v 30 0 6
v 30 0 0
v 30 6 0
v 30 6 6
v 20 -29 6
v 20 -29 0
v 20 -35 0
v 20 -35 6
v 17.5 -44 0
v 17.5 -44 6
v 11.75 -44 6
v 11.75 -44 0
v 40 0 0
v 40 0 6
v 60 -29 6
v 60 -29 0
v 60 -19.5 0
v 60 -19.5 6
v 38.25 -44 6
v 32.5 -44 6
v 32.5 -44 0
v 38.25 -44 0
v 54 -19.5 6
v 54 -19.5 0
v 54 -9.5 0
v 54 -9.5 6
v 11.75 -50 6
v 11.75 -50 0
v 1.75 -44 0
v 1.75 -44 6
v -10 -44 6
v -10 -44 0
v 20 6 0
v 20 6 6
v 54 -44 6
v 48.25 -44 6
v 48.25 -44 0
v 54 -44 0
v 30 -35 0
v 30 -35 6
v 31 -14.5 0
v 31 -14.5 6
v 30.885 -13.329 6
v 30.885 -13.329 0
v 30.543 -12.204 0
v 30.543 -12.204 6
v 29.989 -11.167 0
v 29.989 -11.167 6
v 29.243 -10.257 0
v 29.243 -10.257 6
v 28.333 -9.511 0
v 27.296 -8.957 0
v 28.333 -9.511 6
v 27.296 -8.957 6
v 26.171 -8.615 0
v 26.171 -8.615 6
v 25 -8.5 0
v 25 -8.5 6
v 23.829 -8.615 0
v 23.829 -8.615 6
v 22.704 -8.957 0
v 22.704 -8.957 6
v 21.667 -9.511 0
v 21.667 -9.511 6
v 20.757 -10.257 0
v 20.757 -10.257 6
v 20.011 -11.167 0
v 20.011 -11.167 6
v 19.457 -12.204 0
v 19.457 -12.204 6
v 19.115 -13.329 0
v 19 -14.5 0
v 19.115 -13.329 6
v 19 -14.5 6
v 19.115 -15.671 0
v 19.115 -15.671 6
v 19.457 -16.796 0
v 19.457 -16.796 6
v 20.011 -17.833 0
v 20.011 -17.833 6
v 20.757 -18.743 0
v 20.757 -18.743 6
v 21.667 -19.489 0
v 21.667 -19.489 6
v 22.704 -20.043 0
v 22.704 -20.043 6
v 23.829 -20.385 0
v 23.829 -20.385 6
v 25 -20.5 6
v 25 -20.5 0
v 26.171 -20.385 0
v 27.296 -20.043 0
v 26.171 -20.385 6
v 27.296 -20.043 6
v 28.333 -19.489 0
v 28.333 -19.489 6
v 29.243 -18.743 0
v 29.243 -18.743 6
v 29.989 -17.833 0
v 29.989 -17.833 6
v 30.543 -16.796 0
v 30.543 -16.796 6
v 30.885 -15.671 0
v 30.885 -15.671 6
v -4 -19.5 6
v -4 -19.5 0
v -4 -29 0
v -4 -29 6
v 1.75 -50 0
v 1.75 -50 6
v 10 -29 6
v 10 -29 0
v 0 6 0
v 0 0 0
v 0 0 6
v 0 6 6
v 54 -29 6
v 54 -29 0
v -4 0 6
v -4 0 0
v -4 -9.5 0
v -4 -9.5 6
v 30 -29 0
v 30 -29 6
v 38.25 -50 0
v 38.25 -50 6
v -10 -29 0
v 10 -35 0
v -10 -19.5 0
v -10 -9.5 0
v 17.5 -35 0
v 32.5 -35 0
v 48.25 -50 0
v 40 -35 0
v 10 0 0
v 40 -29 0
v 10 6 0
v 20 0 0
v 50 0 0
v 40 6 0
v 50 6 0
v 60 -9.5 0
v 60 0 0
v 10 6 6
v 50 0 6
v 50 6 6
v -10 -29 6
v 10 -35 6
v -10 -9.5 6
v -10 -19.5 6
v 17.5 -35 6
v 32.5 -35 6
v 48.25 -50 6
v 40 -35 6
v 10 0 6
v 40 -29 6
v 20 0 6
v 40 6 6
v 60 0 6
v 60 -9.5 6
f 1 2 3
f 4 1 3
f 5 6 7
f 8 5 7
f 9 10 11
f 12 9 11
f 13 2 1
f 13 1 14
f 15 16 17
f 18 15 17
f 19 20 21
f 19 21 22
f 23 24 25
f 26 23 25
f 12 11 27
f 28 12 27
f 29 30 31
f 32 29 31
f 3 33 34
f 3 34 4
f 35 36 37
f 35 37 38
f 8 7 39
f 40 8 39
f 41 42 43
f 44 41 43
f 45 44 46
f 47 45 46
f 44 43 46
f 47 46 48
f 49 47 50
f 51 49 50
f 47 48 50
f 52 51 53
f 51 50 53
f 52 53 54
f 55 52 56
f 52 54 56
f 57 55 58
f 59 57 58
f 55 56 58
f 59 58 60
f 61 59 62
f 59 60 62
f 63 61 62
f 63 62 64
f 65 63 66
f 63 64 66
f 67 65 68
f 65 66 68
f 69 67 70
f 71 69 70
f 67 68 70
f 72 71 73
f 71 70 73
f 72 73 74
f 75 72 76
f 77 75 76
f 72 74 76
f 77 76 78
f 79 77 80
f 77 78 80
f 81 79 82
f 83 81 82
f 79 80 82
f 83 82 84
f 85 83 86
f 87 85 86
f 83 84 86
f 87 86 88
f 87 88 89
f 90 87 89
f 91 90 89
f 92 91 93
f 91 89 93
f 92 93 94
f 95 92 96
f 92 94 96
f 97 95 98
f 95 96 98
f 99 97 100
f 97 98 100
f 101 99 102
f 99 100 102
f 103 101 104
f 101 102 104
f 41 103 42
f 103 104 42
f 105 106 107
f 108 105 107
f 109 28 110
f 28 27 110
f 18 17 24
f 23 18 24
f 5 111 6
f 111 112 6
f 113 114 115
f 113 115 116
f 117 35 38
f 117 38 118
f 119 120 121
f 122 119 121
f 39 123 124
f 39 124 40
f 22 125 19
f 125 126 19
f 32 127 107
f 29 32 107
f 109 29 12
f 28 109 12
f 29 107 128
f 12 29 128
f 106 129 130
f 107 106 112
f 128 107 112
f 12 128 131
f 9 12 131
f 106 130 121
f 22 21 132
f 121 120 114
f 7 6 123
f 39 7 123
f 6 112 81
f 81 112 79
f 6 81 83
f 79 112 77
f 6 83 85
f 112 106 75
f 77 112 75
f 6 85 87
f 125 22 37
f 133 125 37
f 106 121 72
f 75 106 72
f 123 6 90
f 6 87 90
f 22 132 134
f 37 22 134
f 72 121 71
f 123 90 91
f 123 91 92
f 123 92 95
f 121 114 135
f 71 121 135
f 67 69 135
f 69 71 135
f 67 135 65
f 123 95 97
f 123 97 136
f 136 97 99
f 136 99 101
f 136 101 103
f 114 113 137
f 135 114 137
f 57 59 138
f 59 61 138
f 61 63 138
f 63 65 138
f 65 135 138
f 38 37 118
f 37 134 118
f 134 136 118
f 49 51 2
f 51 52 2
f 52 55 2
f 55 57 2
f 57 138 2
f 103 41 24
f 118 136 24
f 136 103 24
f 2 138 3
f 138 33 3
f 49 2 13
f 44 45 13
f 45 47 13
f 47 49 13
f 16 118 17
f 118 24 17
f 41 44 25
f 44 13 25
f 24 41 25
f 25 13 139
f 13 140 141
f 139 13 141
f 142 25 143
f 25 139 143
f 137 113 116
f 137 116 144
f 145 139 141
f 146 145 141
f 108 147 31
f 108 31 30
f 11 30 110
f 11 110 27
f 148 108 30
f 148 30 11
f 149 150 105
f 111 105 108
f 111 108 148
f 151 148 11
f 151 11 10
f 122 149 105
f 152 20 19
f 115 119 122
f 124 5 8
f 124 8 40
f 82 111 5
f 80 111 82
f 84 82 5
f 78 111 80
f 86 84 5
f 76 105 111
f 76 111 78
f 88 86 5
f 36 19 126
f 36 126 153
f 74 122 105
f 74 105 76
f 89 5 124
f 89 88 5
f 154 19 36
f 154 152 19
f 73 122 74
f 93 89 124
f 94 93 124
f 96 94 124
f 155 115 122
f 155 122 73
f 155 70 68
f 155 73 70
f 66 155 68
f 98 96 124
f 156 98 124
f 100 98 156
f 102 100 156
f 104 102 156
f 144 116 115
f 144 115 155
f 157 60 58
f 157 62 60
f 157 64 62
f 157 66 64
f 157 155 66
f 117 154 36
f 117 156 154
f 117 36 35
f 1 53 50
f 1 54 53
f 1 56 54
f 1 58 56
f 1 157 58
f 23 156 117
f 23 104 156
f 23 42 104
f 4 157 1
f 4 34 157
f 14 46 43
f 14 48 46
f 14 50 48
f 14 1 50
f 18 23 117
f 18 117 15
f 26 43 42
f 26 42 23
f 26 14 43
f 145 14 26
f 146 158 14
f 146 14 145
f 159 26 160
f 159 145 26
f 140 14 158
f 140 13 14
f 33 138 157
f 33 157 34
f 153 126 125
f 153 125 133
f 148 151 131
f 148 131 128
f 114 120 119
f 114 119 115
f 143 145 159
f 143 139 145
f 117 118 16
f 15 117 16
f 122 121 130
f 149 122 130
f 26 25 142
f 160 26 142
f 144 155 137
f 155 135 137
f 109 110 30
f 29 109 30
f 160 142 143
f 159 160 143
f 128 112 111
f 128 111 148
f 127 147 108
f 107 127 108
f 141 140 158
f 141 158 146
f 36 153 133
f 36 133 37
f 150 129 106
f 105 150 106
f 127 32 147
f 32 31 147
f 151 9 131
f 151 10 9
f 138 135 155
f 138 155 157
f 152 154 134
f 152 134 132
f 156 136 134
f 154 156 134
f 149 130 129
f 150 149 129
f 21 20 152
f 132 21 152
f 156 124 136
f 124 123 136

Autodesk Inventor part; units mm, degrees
ref_plane "YZ Plane" through (0, 0, 0) normal (1, 0, 0) x (0, 1, 0)
ref_plane "XZ Plane" through (0, 0, 0) normal (0, 1, 0) x (-1, 0, 0)
ref_plane "XY Plane" through (0, 0, 0) normal (0, 0, 1) x (1, 0, 0)
ref_plane "Work Plane1" through (20, 0, 0) normal (0, 0, 1) x (1, 0, 0)
sketch "Sketch1" plane through (20, 0, 0) normal (0, 0, 1) x (1, 0, 0)
  line L0 (-20, 0) -> (-10, 0)
  line L1 (-10, 0) -> (-10, 6)
  line L2 (-20, 6) -> (-10, 6)
  line L3 (-20, 0) -> (-20, 6)
  line L4 (0, 0) -> (10, 0)
  line L5 (10, 0) -> (10, 6)
  line L6 (0, 6) -> (10, 6)
  line L7 (0, 0) -> (0, 6)
  line L8 (20, 0) -> (30, 0)
  line L9 (30, 0) -> (30, 6)
  line L10 (20, 6) -> (30, 6)
  line L11 (20, 0) -> (20, 6)
  line L12 (-30, 0) -> (-24, 0)
  line L13 (-24, 0) -> (-24, 6)
  line L14 (-30, 6) -> (-24, 6)
  line L15 (-30, 0) -> (-30, 6)
  line L16 (-30, 0) -> (-20, 0)
  line L17 (-10, 0) -> (0, 0)
  line L18 (10, 0) -> (20, 0)
  line L19 (30, 0) -> (40, 0)
  line L20 (40, 0) -> (-24, 0)
  line L21 (-24, 0) -> (-24, -29)
  line L22 (-24, -29) -> (40, -29)
  line L23 (40, -29) -> (40, 0)
  line L24 (-24, -9.5) -> (-30, -9.5)
  line L25 (-30, -9.5) -> (-30, -19.5)
  line L26 (-30, -19.5) -> (-24, -19.5)
  line L27 (-24, -19.5) -> (-24, -9.5)
  line L28 (40, -19.5) -> (34, -19.5)
  line L29 (34, -19.5) -> (34, -9.5)
  line L30 (34, -9.5) -> (40, -9.5)
  line L31 (40, -9.5) -> (40, -19.5)
  line L32 (-24, -14.5) -> (40, -14.5) construction
  line L33 (-20, -29) -> (-10, -29)
  line L34 (-10, -29) -> (-10, -35)
  line L35 (-20, -35) -> (-10, -35)
  line L36 (-20, -29) -> (-20, -35)
  line L37 (0, -29) -> (10, -29)
  line L38 (10, -29) -> (10, -35)
  line L39 (0, -35) -> (10, -35)
  line L40 (0, -29) -> (0, -35)
  line L41 (20, -29) -> (30, -29)
  line L42 (30, -29) -> (30, -35)
  line L43 (20, -35) -> (30, -35)
  line L44 (20, -29) -> (20, -35)
  line L45 (-10, -29) -> (0, -29)
  line L46 (10, -29) -> (20, -29)
  point P0 (-30, -14.5)
  point P1 (34, -14.5)
  dimension "d0" = 29
  dimension "d1" = 6
  dimension "d2" = 10
extrude "Plate1" add sketch "Sketch1" along normal blind 6 contours L3 L2 L1 L0 | L0 L17 L4 L18 L8 L19 L23 L30 L29 L28 L22 L21 L16 | L7 L6 L5 L4 | L21 L26 L25 L24 | L11 L10 L9 L8 | L22 L34 L35 L36 | L22 L38 L39 L40 | L22 L42 L43 L44
sketch "Sketch2" plane through (20, 0, 6) normal (0, 0, 1) x (1, 0, 0)
  line L0 (-24, -44) -> (-24, -29)
  line L1 (-18.25, -44) -> (-30, -44)
  line L2 (-2.5, -44) -> (-8.25, -44)
  line L3 (-2.5, -35.5) -> (-2.5, -44)
  line L4 (12, -35) -> (-2, -35)
  line L5 (10, -35) -> (0, -35) construction
  line L6 (5, -35) -> (5, 6) construction
  line L7 (0, 6) -> (10, 6) construction
  line L8 (40, -19.5) -> (34, -19.5)
  line L9 (34, -19.5) -> (34, -9.5)
  line L10 (34, -9.5) -> (40, -9.5)
  line L11 (40, 0) -> (40, -9.5)
  line L12 (30, 0) -> (40, 0)
  line L13 (30, 6) -> (30, 0)
  line L14 (20, 6) -> (30, 6)
  line L15 (20, 0) -> (20, 6)
  line L16 (10, 0) -> (20, 0)
  line L17 (10, 6) -> (10, 0)
  line L18 (0, 6) -> (10, 6)
  line L19 (0, 0) -> (0, 6)
  line L20 (-10, 0) -> (0, 0)
  line L21 (-10, 6) -> (-10, 0)
  line L22 (-20, 6) -> (-10, 6)
  line L23 (-20, 0) -> (-20, 6)
  line L24 (-24, 0) -> (-20, 0)
  line L25 (-24, -9.5) -> (-24, 0)
  line L26 (-30, -9.5) -> (-24, -9.5)
  line L27 (-30, -19.5) -> (-30, -9.5)
  line L28 (-24, -19.5) -> (-30, -19.5)
  line L29 (-24, -29) -> (-24, -19.5)
  line L30 (-20, -29) -> (-24, -29)
  line L31 (-20, -35) -> (-20, -29)
  line L32 (-10, -35) -> (-20, -35)
  line L33 (-10, -29) -> (-10, -35)
  line L34 (0, -29) -> (-10, -29)
  line L35 (0, -35) -> (0, -29)
  line L36 (10, -35) -> (0, -35)
  line L37 (10, -29) -> (10, -35)
  line L38 (20, -29) -> (10, -29)
  line L39 (20, -35) -> (20, -29)
  line L40 (30, -35) -> (20, -35)
  line L41 (30, -29) -> (30, -35)
  line L42 (40, -29) -> (30, -29)
  line L43 (40, -19.5) -> (40, -29)
  line L44 (-2.5, -44) -> (-2.5, -35)
  line L45 (-2.5, -35) -> (0, -35)
  line L46 (-8.25, -50) -> (-18.25, -50)
  line L47 (-18.25, -50) -> (-18.25, -44)
  line L48 (34, -44) -> (34, -29)
  line L49 (12.5, -44) -> (18.25, -44)
  line L50 (12.5, -35.5) -> (12.5, -44)
  line L51 (30, -29) -> (34, -29)
  line L52 (30, -35) -> (30, -29)
  line L53 (20, -35) -> (30, -35)
  line L54 (20, -29) -> (20, -35)
  line L55 (10, -29) -> (20, -29)
  line L56 (10, -35) -> (10, -29)
  line L57 (12.5, -44) -> (12.5, -35)
  line L58 (12.5, -35) -> (10, -35)
  line L59 (18.25, -50) -> (28.25, -50)
  line L60 (28.25, -50) -> (28.25, -44)
  line L61 (28.25, -44) -> (34, -44)
  line L62 (-24, -29) -> (-20, -29)
  line L63 (-20, -35) -> (-20, -29)
  line L64 (-20, -35) -> (-20, -29)
  line L65 (-20, -35) -> (-10, -35)
  line L66 (-10, -35) -> (-10, -29)
  line L67 (0, -29) -> (-10, -29)
  line L68 (0, -29) -> (0, -35)
  line L69 (-8.25, -44) -> (-8.25, -50)
  line L70 (18.25, -50) -> (18.25, -44)
  line L71 (34, -44) -> (34, -29)
  line L72 (28.25, -44) -> (40, -44)
  line L73 (12.5, -44) -> (18.25, -44)
  line L74 (12.5, -35.5) -> (12.5, -44)
  line L75 (30, -29) -> (34, -29)
  line L76 (30, -35) -> (30, -29)
  line L77 (20, -35) -> (30, -35)
  line L78 (20, -29) -> (20, -35)
  line L79 (10, -29) -> (20, -29)
  line L80 (10, -35) -> (10, -29)
  line L81 (12.5, -44) -> (12.5, -35)
  line L82 (12.5, -35) -> (10, -35)
  line L83 (18.25, -50) -> (28.25, -50)
  line L84 (28.25, -50) -> (28.25, -44)
  line L85 (34, -29) -> (30, -29)
  line L86 (30, -35) -> (30, -29)
  line L87 (30, -35) -> (30, -29)
  line L88 (30, -35) -> (20, -35)
  line L89 (20, -35) -> (20, -29)
  line L90 (10, -29) -> (20, -29)
  line L91 (10, -29) -> (10, -35)
  line L92 (18.25, -44) -> (18.25, -50)
  line L93 (-24, -44) -> (-30, -44)
  line L94 (-30, -44) -> (-30, -29)
  line L95 (-30, -29) -> (-24, -29)
  line L96 (-24, -29) -> (-24, -44)
  line L97 (-10, -29) -> (0, -29)
  line L98 (0, -29) -> (0, -35)
  line L99 (0, -35) -> (-10, -35)
  line L100 (-10, -35) -> (-10, -29)
  line L101 (20, -29) -> (10, -29)
  line L102 (10, -29) -> (20, -29)
  line L103 (20, -29) -> (20, -35)
  line L104 (20, -35) -> (10, -35)
  line L105 (10, -35) -> (10, -29)
  line L106 (30, -29) -> (34, -29)
  line L107 (34, -29) -> (34, -35)
  line L108 (34, -35) -> (30, -35)
  line L109 (30, -35) -> (30, -29)
  line L110 (-20, -29) -> (-24, -29)
  line L111 (-24, -29) -> (-24, -35)
  line L112 (-24, -35) -> (-20, -35)
  line L113 (-20, -35) -> (-20, -29)
  line L114 (30, -35) -> (20, -35)
  point P0 (-2.5, -49.5)
  point P1 (12.5, -49.5)
  point P2 (12.5, -49.5)
  dimension "d4" = 10
  dimension "d6" = 6
  dimension "d12" = 6
  dimension "d13" = 15
sheet face with bend "Face2" sketch "Sketch2" thickness 6 toward (0, 0, -1) bend radius 6 contours L1 L94 L95 L0 | L0 L112 L32 L99 L44 L3 L2 L69 L46 L47 L1 | L0 L30 L31 L112 | L104 L40 L108 L48 L61 L60 L59 L70 L49 L50 L57 | L41 L42 L48 L108
bend "Bend1"
sketch "Sketch3" plane through (20, 0, 6) normal (0, 0, 1) x (1, 0, 0)
  line L0 (40, -19.5) -> (34, -19.5) projected
  line L1 (34, -19.5) -> (34, -9.5) projected
  line L2 (34, -9.5) -> (40, -9.5) projected
  line L3 (40, 0) -> (40, -9.5) projected
  line L4 (30, 0) -> (40, 0) projected
  line L5 (30, 6) -> (30, 0) projected
  line L6 (20, 6) -> (30, 6) projected
  line L7 (20, 0) -> (20, 6) projected
  line L8 (10, 0) -> (20, 0) projected
  line L9 (10, 6) -> (10, 0) projected
  line L10 (0, 6) -> (10, 6) projected
  line L11 (0, 0) -> (0, 6) projected
  line L12 (-10, 0) -> (0, 0) projected
  line L13 (-10, 6) -> (-10, 0) projected
  line L14 (-20, 6) -> (-10, 6) projected
  line L15 (-20, 0) -> (-20, 6) projected
  line L16 (-24, 0) -> (-20, 0) projected
  line L17 (-24, -9.5) -> (-24, 0) projected
  line L18 (-30, -9.5) -> (-24, -9.5) projected
  line L19 (-30, -19.5) -> (-30, -9.5) projected
  line L20 (-24, -19.5) -> (-30, -19.5) projected
  line L21 (-24, -29) -> (-24, -19.5) projected
  line L22 (-24, -29) -> (-30, -29) projected
  line L23 (-30, -29) -> (-30, -44) projected
  line L24 (-30, -44) -> (-18.25, -44) projected
  line L25 (-18.25, -44) -> (-18.25, -50) projected
  line L26 (-18.25, -50) -> (-8.25, -50) projected
  line L27 (-8.25, -50) -> (-8.25, -44) projected
  line L28 (-8.25, -44) -> (-2.5, -44) projected
  line L29 (-2.5, -44) -> (-2.5, -35) projected
  line L30 (-2.5, -35) -> (-10, -35) projected
  line L31 (-10, -29) -> (-10, -35) projected
  line L32 (0, -29) -> (-10, -29) projected
  line L33 (0, -35) -> (0, -29) projected
  line L34 (10, -35) -> (0, -35) projected
  line L35 (10, -29) -> (10, -35) projected
  line L36 (20, -29) -> (10, -29) projected
  line L37 (20, -35) -> (20, -29) projected
  line L38 (20, -35) -> (12.5, -35) projected
  line L39 (12.5, -35) -> (12.5, -44) projected
  line L40 (12.5, -44) -> (18.25, -44) projected
  line L41 (18.25, -44) -> (18.25, -50) projected
  line L42 (18.25, -50) -> (28.25, -50) projected
  line L43 (28.25, -50) -> (28.25, -44) projected
  line L44 (28.25, -44) -> (34, -44) projected
  line L45 (34, -44) -> (34, -29) projected
  line L46 (40, -29) -> (34, -29) projected
  line L47 (40, -19.5) -> (40, -29) projected
  circle A0 centre (5, -14.5) radius 6
  point P0 (5, 6)
  point P1 (34, -14.5)
  dimension "d14" = 12
extrude "Cut1" cut sketch "Sketch3" against normal blind 6 contours A0
equation "\"d12\" = d6"
equation "\"d15\" = Thickness"
equation "\"d3\" = Thickness"
equation "\"d7\" = BendRadius"
equation "\"d8\" = BendReliefWidth"
equation "\"d10\" = MinimumRemnant"
equation "\"d9\" = BendReliefDepth"
equation "\"d11\" = TransitionRadius"
equation "\"BendRadius\" = Thickness"
equation "\"BendReliefWidth\" = Thickness"
equation "\"BendReliefDepth\" = 0.5 * Thickness"
equation "\"CornerReliefSize\" = 4 * Thickness"
equation "\"MinimumRemnant\" = 2 * Thickness"
equation "\"TransitionRadius\" = BendRadius"
equation "\"JacobiRadiusSize\" = BendRadius"
equation "\"GapSize\" = Thickness"
equation "\"Thickness\" = 6"
properties part number "jotstick behuizing zijkant 2.1" material "Wood (Birch)"
